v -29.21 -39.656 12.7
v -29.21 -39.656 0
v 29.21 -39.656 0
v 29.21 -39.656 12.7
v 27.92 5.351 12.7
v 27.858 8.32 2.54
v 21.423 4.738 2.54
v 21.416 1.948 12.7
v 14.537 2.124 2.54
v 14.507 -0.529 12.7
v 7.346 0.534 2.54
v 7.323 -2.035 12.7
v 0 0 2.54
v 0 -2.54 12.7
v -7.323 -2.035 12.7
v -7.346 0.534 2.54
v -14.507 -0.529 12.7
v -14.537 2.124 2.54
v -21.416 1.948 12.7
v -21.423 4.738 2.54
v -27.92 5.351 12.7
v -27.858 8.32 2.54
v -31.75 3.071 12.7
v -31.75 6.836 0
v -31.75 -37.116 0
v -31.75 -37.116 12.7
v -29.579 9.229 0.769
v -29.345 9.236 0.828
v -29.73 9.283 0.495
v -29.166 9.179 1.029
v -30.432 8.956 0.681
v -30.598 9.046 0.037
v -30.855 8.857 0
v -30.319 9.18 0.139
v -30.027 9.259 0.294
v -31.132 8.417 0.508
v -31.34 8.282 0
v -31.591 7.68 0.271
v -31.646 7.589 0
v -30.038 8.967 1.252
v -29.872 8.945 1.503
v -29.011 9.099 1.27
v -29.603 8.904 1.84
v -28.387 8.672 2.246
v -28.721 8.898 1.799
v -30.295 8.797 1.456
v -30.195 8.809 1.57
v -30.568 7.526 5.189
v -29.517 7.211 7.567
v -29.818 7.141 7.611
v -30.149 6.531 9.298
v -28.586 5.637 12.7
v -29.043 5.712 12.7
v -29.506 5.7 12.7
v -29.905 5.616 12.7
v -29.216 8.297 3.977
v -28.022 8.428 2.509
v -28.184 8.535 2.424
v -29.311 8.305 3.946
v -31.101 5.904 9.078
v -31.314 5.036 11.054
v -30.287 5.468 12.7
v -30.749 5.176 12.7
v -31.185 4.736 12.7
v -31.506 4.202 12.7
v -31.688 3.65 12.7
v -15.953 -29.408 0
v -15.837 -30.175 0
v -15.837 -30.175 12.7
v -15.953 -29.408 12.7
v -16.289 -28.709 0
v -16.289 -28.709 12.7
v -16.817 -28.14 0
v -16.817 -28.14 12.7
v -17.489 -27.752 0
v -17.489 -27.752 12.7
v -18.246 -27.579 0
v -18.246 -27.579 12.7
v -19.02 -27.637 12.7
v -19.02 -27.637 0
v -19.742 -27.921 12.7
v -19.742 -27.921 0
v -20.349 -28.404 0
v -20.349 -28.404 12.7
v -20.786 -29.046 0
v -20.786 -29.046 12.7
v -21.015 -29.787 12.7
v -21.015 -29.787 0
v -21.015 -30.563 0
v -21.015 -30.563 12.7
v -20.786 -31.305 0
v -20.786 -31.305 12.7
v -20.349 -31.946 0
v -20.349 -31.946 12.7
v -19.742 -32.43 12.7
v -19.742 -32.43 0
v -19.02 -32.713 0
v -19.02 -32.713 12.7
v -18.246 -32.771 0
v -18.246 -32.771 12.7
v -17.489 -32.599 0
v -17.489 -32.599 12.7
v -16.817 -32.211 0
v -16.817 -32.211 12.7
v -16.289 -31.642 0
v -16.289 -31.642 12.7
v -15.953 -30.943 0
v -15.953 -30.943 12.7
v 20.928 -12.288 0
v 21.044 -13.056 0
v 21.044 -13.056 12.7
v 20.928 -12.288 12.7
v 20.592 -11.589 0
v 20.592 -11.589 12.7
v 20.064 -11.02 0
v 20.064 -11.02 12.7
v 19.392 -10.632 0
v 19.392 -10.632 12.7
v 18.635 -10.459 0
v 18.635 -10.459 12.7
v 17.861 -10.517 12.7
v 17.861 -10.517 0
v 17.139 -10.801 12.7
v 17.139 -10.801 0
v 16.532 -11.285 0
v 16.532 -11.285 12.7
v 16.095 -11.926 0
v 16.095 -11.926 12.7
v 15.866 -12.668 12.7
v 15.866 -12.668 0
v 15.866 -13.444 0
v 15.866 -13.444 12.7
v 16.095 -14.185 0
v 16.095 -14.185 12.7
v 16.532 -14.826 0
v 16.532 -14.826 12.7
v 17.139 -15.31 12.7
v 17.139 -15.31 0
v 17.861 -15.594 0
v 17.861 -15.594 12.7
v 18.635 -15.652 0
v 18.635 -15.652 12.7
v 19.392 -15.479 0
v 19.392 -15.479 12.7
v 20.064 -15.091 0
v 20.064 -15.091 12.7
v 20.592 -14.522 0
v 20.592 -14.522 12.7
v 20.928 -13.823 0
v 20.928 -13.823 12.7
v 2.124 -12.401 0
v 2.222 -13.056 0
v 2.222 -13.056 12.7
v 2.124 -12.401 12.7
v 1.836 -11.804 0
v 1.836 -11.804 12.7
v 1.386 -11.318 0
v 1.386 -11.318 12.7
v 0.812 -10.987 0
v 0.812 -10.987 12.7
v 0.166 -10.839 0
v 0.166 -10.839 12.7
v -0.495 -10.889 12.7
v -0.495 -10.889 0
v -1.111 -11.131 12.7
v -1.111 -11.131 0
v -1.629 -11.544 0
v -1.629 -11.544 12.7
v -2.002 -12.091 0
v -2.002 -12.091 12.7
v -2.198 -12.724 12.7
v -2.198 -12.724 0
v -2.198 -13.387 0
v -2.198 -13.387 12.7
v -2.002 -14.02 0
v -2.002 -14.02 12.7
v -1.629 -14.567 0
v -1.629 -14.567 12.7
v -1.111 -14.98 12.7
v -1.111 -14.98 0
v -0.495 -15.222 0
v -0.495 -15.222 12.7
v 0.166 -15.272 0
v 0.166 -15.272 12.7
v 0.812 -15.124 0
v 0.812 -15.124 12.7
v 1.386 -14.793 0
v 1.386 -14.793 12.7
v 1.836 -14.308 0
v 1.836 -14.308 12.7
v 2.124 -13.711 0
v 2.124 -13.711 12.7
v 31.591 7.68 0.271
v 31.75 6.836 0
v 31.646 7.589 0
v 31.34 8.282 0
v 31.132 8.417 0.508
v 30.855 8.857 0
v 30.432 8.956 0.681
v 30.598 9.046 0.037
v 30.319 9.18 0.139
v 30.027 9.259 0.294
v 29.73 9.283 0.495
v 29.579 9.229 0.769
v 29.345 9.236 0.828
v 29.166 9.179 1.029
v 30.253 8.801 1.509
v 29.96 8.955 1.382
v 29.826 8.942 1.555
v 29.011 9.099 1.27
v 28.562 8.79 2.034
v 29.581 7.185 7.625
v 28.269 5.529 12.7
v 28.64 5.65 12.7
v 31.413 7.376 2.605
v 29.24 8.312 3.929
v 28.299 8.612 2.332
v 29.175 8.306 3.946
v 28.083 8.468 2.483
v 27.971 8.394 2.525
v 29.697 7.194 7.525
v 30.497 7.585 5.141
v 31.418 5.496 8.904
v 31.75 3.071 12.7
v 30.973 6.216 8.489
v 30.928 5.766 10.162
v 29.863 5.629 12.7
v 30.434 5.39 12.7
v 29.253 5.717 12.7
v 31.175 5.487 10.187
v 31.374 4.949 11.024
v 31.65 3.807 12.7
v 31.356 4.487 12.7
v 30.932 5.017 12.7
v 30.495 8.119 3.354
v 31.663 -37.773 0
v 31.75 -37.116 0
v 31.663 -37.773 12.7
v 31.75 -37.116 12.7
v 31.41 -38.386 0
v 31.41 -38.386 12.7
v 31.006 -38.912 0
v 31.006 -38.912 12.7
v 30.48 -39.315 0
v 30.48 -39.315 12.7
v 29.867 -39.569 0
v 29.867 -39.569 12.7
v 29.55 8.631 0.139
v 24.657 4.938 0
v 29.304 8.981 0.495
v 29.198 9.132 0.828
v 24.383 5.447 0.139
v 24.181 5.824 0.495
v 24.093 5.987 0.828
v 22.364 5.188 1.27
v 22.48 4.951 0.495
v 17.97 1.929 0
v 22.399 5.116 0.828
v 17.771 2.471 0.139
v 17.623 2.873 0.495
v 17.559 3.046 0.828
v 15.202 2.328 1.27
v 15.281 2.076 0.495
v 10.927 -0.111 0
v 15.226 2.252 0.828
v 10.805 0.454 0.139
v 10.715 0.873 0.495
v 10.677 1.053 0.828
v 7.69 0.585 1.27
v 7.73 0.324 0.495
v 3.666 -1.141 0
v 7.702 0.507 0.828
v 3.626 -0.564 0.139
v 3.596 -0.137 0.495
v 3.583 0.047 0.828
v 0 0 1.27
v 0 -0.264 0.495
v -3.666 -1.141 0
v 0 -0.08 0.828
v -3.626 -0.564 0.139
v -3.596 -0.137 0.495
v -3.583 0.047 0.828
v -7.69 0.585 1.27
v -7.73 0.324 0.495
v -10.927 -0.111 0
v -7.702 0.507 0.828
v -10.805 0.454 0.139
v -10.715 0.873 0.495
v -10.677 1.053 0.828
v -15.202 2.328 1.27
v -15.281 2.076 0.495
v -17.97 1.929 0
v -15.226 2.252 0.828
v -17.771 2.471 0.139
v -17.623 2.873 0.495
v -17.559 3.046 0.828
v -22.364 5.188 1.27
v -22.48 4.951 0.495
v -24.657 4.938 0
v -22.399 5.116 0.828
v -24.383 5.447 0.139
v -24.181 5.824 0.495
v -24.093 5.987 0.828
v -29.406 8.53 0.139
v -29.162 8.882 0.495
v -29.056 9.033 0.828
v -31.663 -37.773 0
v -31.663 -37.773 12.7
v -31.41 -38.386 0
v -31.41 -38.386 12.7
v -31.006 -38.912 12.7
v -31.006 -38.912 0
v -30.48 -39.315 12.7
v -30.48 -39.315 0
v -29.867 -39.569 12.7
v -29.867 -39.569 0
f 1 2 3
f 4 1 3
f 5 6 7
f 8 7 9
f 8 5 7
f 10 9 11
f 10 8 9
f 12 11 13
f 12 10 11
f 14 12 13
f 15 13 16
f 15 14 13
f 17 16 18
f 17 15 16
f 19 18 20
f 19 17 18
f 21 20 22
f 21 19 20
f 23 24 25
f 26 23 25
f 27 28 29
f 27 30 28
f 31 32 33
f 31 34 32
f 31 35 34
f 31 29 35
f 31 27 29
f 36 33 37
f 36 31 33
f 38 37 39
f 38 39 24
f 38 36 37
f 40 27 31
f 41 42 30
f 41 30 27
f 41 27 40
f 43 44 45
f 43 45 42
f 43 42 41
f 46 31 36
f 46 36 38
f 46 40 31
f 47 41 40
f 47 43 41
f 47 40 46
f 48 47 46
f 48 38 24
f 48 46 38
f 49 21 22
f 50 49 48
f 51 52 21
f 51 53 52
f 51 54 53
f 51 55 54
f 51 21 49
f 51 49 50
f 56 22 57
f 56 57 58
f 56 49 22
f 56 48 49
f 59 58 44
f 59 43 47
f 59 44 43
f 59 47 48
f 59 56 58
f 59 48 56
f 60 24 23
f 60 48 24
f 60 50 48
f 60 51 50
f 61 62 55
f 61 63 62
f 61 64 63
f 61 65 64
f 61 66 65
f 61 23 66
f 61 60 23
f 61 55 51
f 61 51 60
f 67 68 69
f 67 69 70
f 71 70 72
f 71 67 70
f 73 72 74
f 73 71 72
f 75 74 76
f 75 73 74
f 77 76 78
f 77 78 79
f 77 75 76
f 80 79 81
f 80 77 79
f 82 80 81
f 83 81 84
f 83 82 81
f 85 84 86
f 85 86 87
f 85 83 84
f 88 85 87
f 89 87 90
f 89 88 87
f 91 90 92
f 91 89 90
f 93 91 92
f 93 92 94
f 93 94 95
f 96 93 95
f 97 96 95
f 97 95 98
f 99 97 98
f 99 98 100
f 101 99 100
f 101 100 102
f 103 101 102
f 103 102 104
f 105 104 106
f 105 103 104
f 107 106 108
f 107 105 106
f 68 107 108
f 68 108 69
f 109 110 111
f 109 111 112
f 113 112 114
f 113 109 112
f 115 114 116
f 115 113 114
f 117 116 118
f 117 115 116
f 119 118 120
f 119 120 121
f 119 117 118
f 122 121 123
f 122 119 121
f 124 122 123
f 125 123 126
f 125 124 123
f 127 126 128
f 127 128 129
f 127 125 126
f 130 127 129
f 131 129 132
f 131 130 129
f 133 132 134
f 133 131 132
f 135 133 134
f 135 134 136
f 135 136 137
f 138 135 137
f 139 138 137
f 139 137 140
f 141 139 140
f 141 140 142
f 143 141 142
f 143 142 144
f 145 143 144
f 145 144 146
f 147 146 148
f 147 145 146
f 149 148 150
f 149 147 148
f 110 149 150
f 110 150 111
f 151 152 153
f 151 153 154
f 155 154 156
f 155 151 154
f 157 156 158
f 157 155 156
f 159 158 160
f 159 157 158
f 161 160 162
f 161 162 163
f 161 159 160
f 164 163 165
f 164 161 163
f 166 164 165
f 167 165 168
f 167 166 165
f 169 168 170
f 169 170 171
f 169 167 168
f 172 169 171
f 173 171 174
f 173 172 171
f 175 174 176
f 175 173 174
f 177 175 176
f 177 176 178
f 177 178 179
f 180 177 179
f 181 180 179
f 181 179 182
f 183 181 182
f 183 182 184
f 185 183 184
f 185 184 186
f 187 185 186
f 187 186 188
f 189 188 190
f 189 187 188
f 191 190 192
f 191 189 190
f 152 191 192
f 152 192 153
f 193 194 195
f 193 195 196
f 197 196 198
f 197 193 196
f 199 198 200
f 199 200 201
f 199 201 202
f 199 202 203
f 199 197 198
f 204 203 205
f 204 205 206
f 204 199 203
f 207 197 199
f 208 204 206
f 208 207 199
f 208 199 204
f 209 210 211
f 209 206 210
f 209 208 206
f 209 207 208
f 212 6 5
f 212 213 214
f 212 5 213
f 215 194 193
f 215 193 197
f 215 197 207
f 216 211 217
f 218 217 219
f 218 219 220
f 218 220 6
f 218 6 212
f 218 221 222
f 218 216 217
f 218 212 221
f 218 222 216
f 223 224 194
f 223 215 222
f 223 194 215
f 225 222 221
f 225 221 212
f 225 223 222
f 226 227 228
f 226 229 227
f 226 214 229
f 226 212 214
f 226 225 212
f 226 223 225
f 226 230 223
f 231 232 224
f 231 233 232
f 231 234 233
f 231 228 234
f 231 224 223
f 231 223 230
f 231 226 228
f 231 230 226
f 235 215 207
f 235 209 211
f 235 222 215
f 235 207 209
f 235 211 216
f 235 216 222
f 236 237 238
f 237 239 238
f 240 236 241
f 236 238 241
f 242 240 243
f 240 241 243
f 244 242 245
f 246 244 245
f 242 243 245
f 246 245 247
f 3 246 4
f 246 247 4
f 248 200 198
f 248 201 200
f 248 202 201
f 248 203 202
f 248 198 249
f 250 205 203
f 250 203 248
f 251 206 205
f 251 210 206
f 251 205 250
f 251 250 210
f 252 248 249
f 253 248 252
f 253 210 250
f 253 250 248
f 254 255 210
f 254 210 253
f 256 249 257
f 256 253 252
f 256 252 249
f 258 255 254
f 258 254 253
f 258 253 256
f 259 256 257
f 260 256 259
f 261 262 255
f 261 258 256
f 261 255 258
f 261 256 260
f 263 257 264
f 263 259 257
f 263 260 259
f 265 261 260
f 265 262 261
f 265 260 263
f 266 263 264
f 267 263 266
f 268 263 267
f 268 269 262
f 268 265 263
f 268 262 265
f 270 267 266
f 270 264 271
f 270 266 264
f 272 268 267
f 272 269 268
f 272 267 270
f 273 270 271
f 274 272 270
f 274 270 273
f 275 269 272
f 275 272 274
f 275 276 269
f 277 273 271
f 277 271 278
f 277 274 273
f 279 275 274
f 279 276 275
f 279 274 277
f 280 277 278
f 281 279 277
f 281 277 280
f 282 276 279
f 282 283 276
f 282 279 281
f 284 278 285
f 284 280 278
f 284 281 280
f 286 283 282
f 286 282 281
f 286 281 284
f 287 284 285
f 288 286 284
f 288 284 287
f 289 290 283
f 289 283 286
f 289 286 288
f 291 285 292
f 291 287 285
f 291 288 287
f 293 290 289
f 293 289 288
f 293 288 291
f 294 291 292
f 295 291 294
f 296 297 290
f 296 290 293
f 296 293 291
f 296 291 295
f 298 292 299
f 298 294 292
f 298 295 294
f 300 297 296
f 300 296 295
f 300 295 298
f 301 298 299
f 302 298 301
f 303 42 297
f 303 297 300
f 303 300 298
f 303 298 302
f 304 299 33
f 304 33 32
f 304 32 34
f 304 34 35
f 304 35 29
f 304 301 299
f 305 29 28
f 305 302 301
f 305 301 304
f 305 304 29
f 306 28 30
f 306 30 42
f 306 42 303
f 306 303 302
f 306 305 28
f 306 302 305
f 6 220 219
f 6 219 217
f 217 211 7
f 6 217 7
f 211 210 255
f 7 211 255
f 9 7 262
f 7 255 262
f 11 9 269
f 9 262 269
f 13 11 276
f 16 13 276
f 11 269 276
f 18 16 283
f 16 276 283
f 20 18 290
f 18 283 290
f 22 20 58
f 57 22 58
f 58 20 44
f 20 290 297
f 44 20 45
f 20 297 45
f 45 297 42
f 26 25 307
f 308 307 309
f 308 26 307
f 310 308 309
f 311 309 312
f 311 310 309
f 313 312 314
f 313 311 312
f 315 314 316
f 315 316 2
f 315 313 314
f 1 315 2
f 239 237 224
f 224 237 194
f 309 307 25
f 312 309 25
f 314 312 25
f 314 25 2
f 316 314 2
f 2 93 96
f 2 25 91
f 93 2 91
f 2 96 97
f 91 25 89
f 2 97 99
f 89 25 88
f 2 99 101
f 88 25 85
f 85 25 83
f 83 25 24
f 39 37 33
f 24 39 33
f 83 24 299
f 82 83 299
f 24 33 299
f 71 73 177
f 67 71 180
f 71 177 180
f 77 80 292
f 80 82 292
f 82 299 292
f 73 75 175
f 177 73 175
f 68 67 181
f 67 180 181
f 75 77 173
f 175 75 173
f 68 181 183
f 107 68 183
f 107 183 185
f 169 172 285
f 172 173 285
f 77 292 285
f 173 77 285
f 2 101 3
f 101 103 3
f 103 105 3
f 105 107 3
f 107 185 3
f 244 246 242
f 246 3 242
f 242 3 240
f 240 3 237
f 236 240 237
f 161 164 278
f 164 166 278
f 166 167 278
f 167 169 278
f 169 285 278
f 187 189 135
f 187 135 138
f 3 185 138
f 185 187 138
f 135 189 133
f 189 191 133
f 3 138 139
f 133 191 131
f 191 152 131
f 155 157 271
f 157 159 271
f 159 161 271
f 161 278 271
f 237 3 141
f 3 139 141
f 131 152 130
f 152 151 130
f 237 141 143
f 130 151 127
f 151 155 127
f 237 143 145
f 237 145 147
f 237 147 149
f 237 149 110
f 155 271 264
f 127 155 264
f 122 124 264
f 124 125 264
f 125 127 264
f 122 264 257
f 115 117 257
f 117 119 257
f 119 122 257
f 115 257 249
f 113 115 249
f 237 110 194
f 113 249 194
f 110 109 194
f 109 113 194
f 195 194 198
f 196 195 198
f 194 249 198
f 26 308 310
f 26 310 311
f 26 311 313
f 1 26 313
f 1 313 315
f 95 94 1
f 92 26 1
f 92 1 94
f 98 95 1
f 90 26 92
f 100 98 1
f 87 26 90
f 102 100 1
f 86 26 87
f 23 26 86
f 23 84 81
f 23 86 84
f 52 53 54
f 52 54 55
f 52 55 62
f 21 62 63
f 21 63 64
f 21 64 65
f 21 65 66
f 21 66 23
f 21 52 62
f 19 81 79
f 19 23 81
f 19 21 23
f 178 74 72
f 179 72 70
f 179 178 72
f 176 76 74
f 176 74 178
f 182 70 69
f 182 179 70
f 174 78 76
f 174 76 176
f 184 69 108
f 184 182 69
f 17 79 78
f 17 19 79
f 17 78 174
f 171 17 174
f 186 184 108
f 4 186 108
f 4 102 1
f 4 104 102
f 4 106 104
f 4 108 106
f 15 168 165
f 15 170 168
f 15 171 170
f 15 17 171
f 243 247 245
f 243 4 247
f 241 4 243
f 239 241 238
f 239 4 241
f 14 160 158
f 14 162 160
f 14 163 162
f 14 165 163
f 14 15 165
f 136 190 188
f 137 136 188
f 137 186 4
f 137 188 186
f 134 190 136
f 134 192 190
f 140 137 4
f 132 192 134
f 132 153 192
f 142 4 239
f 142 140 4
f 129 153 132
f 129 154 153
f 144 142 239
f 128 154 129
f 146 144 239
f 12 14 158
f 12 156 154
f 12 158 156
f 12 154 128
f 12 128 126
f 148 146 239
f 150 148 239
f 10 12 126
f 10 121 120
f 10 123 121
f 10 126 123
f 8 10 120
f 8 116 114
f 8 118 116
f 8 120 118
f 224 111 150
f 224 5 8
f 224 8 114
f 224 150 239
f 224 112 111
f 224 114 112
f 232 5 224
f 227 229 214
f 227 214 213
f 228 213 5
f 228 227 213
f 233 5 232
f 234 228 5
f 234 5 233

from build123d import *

# Parameters (mm, degrees)
F0_R     = 2.6035
F0_R_2   = 2.2225
F1_DEPTH = 12.7
F2_SIZE2 = 2.54
F2_SIZE  = 10.16
F3_R     = 2.54
F4_R     = 2.54
F5_R     = 1.27


with BuildPart() as f1:
    # F0 (on Top) → F1 (new body)
    with BuildSketch(Plane.XY):
        with BuildLine():
            ThreePointArc((31.75, 11.1442627102), (0, 0), (-31.75, 11.1442627102))
            Line((-31.75, 11.1442627102), (-31.75, -39.6557372898))
            Line((-31.75, -39.6557372898), (31.75, -39.6557372898))
            Line((31.75, -39.6557372898), (31.75, 11.1442627102))
        make_face()
        with Locations((-18.4404, -30.1752)):
            Circle(F0_R, mode=Mode.SUBTRACT)
        with Locations((0, -13.0556)):
            Circle(F0_R_2, mode=Mode.SUBTRACT)
        with Locations((18.4404, -13.0556)):
            Circle(F0_R, mode=Mode.SUBTRACT)
    extrude(amount=F1_DEPTH)

    # F2
    f2_edges = [f1.edges().sort_by_distance(p)[0] for p in [
        (0, 0, 12.7),
    ]]
    f2_side = f1.faces().sort_by_distance((0, 0, 6.35))[0]
    chamfer(f2_edges, length=F2_SIZE, length2=F2_SIZE2, reference=f2_side)

    # F3
    f3_edges = [f1.edges().sort_by_distance(p)[0] for p in [
        (-31.75, 9.530934, 7.616675),
        (31.75, 9.530934, 7.616675),
    ]]
    fillet(f3_edges, radius=F3_R)

    # F4
    f4_edges = [f1.edges().sort_by_distance(p)[0] for p in [
        (-31.75, -39.655737, 6.35),
        (31.75, -39.655737, 6.35),
    ]]
    fillet(f4_edges, radius=F4_R)

    # F5
    f5_edges = [f1.edges().sort_by_distance(p)[0] for p in [
        (0, 0, 0),
    ]]
    fillet(f5_edges, radius=F5_R)


solid = f1.part
